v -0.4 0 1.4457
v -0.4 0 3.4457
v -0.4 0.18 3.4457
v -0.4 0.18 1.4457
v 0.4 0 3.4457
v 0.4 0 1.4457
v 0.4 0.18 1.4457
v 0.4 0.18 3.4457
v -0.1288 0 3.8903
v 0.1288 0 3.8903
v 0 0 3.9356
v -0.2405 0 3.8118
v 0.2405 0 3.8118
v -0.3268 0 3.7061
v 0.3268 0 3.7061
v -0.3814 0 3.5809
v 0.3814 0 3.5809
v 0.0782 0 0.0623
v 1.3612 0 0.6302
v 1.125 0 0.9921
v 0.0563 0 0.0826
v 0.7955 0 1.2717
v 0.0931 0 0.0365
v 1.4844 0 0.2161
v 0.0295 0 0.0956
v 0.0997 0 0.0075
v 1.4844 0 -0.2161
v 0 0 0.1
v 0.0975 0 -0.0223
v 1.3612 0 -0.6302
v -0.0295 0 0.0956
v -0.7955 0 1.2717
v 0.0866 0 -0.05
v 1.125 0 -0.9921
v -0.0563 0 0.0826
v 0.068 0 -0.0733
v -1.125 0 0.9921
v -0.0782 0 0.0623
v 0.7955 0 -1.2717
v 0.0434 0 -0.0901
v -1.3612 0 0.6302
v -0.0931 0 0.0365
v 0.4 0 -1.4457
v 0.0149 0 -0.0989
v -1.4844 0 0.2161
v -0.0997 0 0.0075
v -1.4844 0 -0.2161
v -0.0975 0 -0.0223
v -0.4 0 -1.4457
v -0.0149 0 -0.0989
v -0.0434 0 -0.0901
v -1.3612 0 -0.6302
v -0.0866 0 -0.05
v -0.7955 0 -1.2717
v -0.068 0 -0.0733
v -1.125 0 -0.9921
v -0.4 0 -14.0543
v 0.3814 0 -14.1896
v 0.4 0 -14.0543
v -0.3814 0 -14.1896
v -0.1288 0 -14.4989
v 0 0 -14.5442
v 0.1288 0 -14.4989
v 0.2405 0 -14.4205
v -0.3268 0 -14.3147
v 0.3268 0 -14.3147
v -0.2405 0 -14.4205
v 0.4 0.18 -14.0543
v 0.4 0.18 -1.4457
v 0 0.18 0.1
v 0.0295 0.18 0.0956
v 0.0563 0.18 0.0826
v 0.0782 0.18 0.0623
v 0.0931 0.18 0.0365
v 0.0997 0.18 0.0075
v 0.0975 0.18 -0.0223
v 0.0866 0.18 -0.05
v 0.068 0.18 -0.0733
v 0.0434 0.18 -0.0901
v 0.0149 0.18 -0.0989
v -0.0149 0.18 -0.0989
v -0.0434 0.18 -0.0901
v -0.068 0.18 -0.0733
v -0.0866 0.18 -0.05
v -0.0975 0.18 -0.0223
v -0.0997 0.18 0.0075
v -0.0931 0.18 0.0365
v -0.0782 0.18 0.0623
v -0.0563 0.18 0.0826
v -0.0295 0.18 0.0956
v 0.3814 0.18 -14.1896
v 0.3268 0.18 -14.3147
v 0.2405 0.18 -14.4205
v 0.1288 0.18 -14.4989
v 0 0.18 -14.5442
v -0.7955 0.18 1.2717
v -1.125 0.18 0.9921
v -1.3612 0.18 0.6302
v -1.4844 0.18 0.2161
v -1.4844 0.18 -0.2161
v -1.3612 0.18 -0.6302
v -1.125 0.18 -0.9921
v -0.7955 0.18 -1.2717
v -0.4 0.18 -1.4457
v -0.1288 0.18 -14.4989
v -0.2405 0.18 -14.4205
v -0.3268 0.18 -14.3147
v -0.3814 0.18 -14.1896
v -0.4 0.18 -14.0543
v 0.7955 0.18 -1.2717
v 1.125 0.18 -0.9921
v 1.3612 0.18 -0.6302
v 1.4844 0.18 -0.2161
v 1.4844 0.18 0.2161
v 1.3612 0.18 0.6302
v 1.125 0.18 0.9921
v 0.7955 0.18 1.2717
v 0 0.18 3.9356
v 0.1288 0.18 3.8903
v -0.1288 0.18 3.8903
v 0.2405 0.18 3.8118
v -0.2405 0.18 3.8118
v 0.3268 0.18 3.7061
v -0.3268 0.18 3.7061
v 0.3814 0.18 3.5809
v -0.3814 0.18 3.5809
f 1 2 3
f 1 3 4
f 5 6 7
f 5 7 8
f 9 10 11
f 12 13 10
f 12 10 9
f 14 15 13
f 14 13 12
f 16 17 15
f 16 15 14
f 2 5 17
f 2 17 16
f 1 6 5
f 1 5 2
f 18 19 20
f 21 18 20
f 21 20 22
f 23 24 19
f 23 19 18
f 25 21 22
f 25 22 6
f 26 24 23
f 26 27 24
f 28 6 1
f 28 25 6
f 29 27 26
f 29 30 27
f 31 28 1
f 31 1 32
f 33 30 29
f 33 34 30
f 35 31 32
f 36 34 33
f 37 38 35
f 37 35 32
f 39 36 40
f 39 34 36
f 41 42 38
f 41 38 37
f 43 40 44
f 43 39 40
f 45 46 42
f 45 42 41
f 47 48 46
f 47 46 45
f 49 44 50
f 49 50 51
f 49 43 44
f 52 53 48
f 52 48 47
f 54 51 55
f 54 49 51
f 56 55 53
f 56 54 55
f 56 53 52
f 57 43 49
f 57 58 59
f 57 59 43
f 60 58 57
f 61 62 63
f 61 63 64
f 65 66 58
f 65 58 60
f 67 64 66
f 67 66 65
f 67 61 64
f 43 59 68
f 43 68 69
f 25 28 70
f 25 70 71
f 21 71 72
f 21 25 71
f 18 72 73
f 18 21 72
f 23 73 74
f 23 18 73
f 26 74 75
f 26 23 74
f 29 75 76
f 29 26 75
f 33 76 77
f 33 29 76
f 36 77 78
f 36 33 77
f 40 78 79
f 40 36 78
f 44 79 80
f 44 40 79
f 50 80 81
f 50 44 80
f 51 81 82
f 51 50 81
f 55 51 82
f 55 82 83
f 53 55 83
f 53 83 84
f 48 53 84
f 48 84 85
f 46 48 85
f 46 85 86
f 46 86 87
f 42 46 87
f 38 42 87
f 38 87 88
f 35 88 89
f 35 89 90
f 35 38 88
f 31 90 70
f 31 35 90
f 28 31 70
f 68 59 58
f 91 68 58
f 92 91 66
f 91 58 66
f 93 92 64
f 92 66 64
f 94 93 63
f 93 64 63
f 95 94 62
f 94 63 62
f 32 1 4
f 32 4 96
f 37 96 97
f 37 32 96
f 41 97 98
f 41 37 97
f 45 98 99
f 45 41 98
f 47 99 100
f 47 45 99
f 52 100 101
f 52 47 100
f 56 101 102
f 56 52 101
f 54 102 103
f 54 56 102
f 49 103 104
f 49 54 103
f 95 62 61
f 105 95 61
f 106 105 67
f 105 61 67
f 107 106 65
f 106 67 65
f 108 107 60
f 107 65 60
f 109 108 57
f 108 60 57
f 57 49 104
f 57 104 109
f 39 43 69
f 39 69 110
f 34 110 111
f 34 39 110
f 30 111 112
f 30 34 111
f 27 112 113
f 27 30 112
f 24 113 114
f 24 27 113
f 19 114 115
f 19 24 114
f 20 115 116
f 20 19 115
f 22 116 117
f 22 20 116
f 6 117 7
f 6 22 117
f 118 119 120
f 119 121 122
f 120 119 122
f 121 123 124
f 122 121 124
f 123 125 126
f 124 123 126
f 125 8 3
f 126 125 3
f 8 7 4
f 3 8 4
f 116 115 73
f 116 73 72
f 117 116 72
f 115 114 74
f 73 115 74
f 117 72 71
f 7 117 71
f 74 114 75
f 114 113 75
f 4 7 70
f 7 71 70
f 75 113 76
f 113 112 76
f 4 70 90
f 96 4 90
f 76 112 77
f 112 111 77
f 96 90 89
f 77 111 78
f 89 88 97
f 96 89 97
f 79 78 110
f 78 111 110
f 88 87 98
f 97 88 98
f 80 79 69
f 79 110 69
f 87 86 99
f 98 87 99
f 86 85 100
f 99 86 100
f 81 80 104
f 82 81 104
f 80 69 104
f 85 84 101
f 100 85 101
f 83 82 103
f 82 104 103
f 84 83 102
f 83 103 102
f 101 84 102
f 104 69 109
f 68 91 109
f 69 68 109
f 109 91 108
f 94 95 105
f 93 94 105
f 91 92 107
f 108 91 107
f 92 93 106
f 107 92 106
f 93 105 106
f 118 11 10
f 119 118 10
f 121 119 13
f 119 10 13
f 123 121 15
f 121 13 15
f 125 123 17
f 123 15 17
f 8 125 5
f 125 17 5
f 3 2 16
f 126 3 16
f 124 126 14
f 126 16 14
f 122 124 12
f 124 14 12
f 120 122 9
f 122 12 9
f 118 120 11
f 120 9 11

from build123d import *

# Parameters (mm, degrees)
SKETCH1_R           = 0.1
BOSS_EXTRUDE2_DEPTH = 0.18
FILLET1_R           = 0.5


with BuildPart() as part:
    # Sketch1 → Boss-Extrude2 (new body)
    with BuildSketch(Plane(origin=(0, 0, 0), x_dir=(1, 0, 0), z_dir=(0, 1, 0))):
        with BuildLine():
            Line((-0.4, -3.945683229), (-0.4, -1.445683229))
            ThreePointArc((-0.4, -1.445683229), (-1.5, 0), (-0.4, 1.445683229))
            Line((-0.4, 1.445683229), (-0.4, 14.554316771))
            Line((-0.4, 14.554316771), (0.4, 14.554316771))
            Line((0.4, 14.554316771), (0.4, 1.445683229))
            ThreePointArc((0.4, 1.445683229), (1.5, 0), (0.4, -1.445683229))
            Line((0.4, -1.445683229), (0.4, -3.945683229))
            Line((0.4, -3.945683229), (-0.4, -3.945683229))
        make_face()
        with Locations(Location((0, 0, 0), (0, 0, 270))):
            Circle(SKETCH1_R, mode=Mode.SUBTRACT)
    extrude(amount=BOSS_EXTRUDE2_DEPTH)

    # Fillet1
    # the kernel refuses this fillet: 0.5 mm, written as the material it takes off along each edge
    with BuildSketch(Plane(origin=(-0.4, -1.25, -14.554316771), x_dir=(0, 0, 1), z_dir=(0, 1, 0)), Plane(origin=(0.4, -1.25, -14.554316771), x_dir=(-1, 0, 0), z_dir=(0, 1, 0)), Plane(origin=(-0.4, -1.25, 3.945683229), x_dir=(1, 0, 0), z_dir=(0, 1, 0)), Plane(origin=(0.4, -1.25, 3.945683229), x_dir=(0, 0, -1), z_dir=(0, 1, 0))) as fillet1_piece_1:
        with BuildLine():
            CenterArc((FILLET1_R, FILLET1_R), FILLET1_R, 180, 90)
            Line((0, FILLET1_R), (0, 0))
            Line((0, 0), (FILLET1_R, 0))
        make_face()
    extrude(amount=2.68, mode=Mode.SUBTRACT)


solid = part.part
